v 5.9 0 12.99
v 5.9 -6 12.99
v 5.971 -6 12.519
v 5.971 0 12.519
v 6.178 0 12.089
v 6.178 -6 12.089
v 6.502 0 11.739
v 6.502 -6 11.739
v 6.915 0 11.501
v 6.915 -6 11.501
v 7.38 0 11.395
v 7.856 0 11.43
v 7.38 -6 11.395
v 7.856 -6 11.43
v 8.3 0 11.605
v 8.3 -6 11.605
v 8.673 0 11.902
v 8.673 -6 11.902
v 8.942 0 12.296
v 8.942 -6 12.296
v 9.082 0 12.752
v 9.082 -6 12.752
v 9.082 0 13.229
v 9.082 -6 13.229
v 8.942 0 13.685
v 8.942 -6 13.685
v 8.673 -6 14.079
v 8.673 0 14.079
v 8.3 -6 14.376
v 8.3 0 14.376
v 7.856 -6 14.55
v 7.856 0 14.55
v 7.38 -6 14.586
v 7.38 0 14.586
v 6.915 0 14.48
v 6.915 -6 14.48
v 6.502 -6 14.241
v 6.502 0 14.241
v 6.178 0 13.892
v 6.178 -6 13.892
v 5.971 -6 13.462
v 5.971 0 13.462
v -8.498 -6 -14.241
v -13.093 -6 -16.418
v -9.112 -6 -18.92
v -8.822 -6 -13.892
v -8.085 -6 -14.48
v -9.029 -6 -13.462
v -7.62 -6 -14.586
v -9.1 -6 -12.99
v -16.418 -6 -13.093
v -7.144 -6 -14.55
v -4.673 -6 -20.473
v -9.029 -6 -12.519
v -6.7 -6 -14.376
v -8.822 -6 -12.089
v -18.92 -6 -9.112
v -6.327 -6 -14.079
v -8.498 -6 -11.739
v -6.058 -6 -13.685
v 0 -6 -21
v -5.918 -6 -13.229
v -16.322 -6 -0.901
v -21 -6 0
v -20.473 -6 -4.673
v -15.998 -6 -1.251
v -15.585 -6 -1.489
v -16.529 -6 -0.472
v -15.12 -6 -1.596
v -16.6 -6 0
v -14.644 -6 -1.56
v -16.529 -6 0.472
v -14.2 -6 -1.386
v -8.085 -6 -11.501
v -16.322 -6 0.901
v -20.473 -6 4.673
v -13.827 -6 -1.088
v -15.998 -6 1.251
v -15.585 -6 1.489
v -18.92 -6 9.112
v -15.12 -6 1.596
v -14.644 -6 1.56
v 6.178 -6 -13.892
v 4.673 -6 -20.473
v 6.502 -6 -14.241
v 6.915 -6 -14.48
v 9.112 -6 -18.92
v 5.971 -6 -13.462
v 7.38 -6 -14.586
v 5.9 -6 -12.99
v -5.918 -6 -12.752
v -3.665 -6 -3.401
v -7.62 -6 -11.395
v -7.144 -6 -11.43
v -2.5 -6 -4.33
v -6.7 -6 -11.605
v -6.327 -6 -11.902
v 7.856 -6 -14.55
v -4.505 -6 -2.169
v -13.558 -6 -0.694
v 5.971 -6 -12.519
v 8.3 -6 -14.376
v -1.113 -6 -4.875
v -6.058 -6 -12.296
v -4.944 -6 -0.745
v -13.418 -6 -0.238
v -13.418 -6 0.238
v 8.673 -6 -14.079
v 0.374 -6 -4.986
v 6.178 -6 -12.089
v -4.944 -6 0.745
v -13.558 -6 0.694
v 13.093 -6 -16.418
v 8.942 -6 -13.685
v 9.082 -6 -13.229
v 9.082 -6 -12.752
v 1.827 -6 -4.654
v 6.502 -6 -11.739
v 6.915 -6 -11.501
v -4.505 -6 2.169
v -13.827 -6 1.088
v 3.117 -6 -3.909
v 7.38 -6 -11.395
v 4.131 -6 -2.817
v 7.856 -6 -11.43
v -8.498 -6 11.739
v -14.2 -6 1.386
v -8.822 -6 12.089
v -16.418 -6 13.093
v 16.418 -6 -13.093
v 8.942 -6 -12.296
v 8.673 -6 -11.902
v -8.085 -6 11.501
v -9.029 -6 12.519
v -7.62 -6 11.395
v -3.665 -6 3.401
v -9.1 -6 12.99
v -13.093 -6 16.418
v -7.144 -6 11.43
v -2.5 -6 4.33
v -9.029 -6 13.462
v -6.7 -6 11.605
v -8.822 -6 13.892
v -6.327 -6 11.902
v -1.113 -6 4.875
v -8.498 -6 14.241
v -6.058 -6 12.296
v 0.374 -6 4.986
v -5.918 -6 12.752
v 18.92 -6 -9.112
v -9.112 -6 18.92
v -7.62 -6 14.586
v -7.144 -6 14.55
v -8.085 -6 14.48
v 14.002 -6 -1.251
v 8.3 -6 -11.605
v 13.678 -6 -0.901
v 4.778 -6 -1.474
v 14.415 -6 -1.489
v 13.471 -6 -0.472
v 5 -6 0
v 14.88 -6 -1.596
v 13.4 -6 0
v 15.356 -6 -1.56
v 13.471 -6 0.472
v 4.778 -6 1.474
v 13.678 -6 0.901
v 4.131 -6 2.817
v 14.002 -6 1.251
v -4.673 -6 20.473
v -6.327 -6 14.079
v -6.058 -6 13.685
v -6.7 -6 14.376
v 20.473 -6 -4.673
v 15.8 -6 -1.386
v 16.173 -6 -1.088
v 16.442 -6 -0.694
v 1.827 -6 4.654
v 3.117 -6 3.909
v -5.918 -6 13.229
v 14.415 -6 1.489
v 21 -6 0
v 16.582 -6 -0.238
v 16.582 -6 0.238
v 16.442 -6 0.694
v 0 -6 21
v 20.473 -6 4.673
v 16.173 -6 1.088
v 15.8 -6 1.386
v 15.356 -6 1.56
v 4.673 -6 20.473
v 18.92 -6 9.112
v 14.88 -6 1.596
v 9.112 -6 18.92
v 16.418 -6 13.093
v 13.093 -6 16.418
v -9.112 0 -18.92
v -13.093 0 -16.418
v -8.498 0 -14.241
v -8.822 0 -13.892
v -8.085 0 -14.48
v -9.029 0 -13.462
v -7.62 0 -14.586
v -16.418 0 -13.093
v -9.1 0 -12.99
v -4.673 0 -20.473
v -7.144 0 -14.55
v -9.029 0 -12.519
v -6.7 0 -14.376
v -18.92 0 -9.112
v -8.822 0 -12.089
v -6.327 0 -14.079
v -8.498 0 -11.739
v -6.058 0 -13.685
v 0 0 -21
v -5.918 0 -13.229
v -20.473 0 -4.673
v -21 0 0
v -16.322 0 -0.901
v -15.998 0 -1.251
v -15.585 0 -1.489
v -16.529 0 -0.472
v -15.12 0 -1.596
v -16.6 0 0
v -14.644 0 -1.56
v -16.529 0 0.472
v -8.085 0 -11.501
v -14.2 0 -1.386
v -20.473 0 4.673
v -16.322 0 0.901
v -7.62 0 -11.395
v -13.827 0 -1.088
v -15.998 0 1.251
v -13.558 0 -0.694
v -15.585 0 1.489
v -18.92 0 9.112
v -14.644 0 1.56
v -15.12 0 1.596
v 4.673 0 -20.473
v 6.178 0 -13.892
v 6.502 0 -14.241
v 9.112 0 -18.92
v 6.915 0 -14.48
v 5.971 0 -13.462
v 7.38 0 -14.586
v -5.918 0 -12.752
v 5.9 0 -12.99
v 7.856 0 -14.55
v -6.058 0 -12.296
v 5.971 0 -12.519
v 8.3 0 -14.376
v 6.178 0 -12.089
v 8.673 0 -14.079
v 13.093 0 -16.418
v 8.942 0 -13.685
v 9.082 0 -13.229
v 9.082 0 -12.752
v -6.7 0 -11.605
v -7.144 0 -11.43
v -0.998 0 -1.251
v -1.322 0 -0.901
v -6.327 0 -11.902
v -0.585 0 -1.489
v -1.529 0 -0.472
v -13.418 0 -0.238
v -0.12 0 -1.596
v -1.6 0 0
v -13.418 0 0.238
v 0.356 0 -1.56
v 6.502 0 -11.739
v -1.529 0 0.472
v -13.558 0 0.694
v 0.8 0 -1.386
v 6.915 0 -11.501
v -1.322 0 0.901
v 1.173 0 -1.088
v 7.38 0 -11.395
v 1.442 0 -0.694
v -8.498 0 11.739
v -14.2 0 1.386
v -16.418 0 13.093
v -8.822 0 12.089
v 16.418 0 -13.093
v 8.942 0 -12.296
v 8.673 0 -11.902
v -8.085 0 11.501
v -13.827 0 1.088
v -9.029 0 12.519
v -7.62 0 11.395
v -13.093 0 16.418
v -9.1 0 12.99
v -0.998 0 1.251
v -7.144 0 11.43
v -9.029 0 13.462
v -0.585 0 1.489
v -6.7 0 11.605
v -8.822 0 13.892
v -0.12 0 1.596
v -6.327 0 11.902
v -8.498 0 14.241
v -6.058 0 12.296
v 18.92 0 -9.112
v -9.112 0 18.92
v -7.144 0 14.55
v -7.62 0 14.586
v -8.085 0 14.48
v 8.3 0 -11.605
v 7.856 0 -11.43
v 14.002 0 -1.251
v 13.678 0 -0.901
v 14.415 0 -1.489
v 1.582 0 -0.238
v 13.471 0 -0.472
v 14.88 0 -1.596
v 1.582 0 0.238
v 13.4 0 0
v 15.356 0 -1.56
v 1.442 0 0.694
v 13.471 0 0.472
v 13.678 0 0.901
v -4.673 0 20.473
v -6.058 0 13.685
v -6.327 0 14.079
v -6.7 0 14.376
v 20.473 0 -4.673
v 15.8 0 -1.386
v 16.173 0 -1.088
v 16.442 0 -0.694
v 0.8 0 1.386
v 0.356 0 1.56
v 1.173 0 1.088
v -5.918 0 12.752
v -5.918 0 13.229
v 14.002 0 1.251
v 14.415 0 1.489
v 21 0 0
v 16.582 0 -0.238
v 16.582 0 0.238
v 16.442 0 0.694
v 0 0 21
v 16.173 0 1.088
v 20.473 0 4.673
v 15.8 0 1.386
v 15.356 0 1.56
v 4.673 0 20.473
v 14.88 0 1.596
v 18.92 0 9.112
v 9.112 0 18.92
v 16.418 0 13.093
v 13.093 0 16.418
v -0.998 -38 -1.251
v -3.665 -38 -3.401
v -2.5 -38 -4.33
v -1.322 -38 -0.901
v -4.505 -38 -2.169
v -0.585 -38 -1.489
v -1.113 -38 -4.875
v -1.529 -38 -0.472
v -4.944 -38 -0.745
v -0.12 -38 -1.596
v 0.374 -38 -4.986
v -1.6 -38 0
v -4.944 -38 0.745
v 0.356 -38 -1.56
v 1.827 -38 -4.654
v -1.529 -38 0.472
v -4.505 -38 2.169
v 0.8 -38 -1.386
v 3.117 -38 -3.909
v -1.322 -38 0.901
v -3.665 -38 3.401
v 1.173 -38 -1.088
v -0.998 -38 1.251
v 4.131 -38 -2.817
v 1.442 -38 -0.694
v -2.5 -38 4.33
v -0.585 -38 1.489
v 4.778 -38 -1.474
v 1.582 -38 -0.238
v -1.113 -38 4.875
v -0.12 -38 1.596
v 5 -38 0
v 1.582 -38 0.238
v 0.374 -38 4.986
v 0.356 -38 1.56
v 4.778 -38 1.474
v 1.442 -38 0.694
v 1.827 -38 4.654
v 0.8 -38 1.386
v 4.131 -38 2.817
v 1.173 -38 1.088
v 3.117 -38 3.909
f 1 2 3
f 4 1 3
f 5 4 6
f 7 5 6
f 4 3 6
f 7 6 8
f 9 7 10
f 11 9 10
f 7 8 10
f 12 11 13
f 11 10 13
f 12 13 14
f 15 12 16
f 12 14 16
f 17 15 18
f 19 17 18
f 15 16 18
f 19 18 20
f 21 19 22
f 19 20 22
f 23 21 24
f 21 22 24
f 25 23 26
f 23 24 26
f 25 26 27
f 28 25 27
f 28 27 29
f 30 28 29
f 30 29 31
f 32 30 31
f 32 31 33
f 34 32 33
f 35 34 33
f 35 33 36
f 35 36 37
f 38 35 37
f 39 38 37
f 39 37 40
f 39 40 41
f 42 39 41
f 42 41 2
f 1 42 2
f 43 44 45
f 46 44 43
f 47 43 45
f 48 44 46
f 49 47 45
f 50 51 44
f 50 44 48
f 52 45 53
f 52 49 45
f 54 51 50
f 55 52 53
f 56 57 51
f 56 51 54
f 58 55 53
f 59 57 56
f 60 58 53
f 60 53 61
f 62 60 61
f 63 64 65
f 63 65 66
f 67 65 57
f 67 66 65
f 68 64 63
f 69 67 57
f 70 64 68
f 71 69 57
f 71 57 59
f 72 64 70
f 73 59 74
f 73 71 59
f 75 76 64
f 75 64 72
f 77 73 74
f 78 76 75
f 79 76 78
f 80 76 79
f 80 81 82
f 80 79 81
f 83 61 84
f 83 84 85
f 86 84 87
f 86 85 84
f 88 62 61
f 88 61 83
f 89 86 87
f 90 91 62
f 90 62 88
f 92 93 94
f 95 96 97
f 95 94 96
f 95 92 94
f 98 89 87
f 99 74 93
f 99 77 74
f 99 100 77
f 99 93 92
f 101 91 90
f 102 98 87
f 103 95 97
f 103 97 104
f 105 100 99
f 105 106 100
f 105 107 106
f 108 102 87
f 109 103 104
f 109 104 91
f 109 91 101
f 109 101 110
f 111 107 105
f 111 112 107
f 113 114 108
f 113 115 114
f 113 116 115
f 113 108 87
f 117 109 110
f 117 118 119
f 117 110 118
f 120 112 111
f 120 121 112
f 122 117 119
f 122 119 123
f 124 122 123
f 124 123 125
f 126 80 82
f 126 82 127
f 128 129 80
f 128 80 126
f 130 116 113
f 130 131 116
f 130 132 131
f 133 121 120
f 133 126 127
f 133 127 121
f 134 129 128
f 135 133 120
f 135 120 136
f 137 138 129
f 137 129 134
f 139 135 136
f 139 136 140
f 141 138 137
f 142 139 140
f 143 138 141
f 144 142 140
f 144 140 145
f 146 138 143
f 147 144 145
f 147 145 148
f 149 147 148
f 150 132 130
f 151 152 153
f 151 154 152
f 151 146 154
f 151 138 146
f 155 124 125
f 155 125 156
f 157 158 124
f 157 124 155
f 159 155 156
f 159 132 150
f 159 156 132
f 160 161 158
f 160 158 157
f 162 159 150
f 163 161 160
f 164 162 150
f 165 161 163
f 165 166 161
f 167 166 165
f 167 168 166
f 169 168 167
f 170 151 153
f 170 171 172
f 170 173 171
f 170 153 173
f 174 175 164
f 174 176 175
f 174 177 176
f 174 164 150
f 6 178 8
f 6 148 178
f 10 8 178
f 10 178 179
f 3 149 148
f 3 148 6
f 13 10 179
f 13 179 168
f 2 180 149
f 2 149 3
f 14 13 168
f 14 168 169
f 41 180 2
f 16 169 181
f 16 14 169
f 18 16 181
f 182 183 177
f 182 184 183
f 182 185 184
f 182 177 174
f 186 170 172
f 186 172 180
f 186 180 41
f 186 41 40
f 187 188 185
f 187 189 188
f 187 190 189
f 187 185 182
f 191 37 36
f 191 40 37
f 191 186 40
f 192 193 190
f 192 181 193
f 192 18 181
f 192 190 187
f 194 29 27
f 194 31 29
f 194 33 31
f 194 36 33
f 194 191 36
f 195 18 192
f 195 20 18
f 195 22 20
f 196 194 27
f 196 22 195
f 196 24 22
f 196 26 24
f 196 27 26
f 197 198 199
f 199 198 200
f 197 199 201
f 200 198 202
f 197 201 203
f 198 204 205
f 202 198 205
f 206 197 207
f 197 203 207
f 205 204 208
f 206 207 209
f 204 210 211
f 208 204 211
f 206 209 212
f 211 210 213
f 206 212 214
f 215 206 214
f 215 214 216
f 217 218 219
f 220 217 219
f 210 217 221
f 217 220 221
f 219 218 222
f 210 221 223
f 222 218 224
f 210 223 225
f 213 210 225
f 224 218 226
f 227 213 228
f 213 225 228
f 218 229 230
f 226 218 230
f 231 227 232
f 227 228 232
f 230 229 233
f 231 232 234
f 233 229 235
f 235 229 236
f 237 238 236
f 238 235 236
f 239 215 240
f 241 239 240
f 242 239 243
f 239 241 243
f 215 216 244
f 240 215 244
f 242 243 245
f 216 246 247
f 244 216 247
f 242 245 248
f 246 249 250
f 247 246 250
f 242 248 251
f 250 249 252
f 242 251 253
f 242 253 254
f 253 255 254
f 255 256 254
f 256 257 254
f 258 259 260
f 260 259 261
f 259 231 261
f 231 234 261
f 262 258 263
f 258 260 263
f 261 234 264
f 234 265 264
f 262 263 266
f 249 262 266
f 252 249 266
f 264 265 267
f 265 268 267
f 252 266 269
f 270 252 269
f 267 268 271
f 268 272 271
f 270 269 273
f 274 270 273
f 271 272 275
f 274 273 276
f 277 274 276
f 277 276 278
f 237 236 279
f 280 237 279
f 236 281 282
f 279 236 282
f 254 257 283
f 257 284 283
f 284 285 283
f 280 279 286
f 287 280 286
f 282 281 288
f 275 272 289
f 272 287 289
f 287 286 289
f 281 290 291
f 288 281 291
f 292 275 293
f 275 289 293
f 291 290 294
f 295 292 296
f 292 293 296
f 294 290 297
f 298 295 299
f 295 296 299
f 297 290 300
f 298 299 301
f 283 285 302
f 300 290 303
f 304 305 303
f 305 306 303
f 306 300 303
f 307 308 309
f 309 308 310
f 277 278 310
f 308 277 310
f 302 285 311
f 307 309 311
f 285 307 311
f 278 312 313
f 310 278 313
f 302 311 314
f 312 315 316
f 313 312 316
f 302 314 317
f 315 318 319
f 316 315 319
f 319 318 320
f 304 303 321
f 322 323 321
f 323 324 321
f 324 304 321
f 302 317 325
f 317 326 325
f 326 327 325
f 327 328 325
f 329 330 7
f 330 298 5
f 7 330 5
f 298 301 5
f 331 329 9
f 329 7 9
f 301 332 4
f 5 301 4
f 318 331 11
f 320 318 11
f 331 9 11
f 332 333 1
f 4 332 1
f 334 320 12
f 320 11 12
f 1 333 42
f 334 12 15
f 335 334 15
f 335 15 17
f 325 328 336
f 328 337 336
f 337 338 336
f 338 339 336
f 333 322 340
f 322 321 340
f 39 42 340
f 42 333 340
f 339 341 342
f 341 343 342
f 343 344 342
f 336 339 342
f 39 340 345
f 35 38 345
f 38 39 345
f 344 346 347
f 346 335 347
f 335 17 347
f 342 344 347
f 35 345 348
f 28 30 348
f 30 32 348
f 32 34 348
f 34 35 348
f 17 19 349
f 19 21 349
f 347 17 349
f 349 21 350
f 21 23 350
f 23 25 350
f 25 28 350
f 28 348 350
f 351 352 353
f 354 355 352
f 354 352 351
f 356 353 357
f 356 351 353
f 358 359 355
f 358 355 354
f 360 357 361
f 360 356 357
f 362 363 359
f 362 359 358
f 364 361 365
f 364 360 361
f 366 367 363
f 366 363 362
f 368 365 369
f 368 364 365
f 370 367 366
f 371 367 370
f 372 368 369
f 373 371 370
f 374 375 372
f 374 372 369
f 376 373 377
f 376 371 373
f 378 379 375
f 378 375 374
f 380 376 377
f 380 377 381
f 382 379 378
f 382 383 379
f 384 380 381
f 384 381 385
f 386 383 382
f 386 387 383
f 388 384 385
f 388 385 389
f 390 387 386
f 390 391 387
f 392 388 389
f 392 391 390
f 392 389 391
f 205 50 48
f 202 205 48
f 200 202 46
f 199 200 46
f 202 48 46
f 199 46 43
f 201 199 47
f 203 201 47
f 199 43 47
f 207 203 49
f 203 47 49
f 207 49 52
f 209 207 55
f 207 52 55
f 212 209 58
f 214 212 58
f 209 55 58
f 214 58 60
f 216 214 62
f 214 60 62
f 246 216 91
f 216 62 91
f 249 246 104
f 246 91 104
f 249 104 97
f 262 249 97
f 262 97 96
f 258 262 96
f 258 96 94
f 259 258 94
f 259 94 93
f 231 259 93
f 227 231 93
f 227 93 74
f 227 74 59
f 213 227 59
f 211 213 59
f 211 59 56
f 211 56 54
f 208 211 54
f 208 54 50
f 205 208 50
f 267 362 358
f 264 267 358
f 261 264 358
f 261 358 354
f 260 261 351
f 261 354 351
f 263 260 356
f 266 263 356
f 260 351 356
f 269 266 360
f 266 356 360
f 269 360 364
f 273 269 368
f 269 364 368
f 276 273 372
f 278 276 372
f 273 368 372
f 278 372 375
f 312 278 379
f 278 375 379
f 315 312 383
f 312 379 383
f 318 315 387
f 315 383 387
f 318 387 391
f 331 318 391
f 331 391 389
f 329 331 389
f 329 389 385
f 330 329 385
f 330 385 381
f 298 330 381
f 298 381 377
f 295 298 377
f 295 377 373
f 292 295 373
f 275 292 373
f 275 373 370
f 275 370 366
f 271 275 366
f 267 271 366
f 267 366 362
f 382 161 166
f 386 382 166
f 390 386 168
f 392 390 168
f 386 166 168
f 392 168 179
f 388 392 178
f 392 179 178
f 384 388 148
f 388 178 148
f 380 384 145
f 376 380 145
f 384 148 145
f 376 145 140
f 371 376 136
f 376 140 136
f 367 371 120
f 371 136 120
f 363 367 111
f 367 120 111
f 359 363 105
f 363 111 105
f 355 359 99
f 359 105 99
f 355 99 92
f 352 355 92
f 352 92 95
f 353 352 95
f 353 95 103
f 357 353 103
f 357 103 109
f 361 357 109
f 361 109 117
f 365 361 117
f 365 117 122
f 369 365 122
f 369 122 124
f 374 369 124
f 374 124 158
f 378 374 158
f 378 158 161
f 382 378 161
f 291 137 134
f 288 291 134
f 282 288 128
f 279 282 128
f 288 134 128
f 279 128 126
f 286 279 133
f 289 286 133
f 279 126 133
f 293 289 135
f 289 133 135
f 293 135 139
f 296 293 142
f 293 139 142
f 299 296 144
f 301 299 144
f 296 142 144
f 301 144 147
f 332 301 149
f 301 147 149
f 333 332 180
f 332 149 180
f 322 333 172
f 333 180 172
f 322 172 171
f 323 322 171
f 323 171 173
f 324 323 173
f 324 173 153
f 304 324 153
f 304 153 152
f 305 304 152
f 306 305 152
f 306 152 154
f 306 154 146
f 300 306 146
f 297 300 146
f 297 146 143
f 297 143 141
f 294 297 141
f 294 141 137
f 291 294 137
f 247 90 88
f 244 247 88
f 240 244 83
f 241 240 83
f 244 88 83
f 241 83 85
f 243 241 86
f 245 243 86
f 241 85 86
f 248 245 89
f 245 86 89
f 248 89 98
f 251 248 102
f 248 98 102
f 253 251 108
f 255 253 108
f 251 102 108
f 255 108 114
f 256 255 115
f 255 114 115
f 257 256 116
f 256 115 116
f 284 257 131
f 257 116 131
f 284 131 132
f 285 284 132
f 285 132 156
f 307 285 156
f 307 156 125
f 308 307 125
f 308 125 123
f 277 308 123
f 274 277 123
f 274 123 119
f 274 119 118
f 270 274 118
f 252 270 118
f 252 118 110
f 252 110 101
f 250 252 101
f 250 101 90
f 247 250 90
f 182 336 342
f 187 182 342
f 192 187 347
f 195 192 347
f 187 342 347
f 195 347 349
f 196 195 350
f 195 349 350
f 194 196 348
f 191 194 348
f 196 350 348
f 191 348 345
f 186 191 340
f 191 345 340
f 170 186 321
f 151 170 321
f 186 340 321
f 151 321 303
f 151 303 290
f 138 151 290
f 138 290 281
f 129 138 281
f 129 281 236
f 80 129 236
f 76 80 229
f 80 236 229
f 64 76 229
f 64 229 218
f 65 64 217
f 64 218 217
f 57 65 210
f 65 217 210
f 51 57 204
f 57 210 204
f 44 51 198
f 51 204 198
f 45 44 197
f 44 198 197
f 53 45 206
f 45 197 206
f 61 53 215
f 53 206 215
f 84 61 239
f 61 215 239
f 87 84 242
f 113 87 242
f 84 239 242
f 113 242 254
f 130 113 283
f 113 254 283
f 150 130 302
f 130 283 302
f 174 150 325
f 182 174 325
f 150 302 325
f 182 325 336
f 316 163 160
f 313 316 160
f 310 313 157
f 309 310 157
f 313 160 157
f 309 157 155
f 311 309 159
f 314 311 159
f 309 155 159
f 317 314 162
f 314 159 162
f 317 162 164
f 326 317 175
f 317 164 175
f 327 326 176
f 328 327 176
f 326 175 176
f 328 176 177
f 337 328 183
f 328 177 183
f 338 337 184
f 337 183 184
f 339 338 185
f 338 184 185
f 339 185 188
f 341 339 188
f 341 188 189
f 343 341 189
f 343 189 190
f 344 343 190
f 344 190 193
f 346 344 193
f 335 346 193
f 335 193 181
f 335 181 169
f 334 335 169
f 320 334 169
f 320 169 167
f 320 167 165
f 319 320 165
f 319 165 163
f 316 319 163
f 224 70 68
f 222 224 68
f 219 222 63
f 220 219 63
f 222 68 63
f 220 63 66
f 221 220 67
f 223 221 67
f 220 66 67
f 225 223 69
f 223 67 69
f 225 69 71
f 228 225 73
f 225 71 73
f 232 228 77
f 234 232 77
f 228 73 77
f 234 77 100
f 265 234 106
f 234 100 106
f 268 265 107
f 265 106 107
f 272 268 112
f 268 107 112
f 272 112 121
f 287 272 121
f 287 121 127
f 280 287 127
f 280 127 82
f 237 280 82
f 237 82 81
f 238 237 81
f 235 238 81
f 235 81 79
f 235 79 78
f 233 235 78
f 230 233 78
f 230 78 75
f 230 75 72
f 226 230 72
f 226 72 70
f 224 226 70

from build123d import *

# Parameters (mm, degrees)
F0_R     = 21
F0_R_2   = 2
F0_R_3   = 5
F1_DEPTH = 6
F2_DEPTH = 38
F3_D     = 3.2


with BuildPart() as f1:
    # F0 (on Front) → F1 (new body)
    with BuildSketch(Plane.XZ):
        Circle(F0_R)
        with Locations((-7.5, -12.9903810568)):
            Circle(F0_R_2, mode=Mode.SUBTRACT)
        with Locations((7.5, -12.9903810568)):
            Circle(F0_R_2, mode=Mode.SUBTRACT)
        with Locations((-15, 0)):
            Circle(F0_R_2, mode=Mode.SUBTRACT)
        with Locations((-7.5, 12.9903810568)):
            Circle(F0_R_2, mode=Mode.SUBTRACT)
        Circle(F0_R_3, mode=Mode.SUBTRACT)
        with Locations((15, 0)):
            Circle(F0_R_2, mode=Mode.SUBTRACT)
        with Locations((7.5, 12.9903810568)):
            Circle(F0_R_2, mode=Mode.SUBTRACT)
        with Locations((-15, 0)):
            Circle(F0_R_2)
        with Locations((-7.5, 12.9903810568)):
            Circle(F0_R_2)
        with Locations((7.5, 12.9903810568)):
            Circle(F0_R_2)
        with Locations((15, 0)):
            Circle(F0_R_2)
        with Locations((7.5, -12.9903810568)):
            Circle(F0_R_2)
        with Locations((-7.5, -12.9903810568)):
            Circle(F0_R_2)
    extrude(amount=F1_DEPTH)

    # F0 (on Front) → F2 (join)
    with BuildSketch(Plane.XZ):
        Circle(F0_R_3)
        Circle(F0_R_2, mode=Mode.SUBTRACT)
        Circle(F0_R_2)
    extrude(amount=F2_DEPTH)

    # F3 (through all)
    with Locations(Plane(origin=(0, 0, 0), x_dir=(1, 0, 0), z_dir=(0, 1, 0))):
        with Locations((-15, 0), (-7.5, -12.9903810568), (7.5, -12.9903810568), (15, 0), (7.5, 12.9903810568), (-7.5, 12.9903810568), (0, 0)):
            Hole(F3_D / 2)


solid = f1.part
